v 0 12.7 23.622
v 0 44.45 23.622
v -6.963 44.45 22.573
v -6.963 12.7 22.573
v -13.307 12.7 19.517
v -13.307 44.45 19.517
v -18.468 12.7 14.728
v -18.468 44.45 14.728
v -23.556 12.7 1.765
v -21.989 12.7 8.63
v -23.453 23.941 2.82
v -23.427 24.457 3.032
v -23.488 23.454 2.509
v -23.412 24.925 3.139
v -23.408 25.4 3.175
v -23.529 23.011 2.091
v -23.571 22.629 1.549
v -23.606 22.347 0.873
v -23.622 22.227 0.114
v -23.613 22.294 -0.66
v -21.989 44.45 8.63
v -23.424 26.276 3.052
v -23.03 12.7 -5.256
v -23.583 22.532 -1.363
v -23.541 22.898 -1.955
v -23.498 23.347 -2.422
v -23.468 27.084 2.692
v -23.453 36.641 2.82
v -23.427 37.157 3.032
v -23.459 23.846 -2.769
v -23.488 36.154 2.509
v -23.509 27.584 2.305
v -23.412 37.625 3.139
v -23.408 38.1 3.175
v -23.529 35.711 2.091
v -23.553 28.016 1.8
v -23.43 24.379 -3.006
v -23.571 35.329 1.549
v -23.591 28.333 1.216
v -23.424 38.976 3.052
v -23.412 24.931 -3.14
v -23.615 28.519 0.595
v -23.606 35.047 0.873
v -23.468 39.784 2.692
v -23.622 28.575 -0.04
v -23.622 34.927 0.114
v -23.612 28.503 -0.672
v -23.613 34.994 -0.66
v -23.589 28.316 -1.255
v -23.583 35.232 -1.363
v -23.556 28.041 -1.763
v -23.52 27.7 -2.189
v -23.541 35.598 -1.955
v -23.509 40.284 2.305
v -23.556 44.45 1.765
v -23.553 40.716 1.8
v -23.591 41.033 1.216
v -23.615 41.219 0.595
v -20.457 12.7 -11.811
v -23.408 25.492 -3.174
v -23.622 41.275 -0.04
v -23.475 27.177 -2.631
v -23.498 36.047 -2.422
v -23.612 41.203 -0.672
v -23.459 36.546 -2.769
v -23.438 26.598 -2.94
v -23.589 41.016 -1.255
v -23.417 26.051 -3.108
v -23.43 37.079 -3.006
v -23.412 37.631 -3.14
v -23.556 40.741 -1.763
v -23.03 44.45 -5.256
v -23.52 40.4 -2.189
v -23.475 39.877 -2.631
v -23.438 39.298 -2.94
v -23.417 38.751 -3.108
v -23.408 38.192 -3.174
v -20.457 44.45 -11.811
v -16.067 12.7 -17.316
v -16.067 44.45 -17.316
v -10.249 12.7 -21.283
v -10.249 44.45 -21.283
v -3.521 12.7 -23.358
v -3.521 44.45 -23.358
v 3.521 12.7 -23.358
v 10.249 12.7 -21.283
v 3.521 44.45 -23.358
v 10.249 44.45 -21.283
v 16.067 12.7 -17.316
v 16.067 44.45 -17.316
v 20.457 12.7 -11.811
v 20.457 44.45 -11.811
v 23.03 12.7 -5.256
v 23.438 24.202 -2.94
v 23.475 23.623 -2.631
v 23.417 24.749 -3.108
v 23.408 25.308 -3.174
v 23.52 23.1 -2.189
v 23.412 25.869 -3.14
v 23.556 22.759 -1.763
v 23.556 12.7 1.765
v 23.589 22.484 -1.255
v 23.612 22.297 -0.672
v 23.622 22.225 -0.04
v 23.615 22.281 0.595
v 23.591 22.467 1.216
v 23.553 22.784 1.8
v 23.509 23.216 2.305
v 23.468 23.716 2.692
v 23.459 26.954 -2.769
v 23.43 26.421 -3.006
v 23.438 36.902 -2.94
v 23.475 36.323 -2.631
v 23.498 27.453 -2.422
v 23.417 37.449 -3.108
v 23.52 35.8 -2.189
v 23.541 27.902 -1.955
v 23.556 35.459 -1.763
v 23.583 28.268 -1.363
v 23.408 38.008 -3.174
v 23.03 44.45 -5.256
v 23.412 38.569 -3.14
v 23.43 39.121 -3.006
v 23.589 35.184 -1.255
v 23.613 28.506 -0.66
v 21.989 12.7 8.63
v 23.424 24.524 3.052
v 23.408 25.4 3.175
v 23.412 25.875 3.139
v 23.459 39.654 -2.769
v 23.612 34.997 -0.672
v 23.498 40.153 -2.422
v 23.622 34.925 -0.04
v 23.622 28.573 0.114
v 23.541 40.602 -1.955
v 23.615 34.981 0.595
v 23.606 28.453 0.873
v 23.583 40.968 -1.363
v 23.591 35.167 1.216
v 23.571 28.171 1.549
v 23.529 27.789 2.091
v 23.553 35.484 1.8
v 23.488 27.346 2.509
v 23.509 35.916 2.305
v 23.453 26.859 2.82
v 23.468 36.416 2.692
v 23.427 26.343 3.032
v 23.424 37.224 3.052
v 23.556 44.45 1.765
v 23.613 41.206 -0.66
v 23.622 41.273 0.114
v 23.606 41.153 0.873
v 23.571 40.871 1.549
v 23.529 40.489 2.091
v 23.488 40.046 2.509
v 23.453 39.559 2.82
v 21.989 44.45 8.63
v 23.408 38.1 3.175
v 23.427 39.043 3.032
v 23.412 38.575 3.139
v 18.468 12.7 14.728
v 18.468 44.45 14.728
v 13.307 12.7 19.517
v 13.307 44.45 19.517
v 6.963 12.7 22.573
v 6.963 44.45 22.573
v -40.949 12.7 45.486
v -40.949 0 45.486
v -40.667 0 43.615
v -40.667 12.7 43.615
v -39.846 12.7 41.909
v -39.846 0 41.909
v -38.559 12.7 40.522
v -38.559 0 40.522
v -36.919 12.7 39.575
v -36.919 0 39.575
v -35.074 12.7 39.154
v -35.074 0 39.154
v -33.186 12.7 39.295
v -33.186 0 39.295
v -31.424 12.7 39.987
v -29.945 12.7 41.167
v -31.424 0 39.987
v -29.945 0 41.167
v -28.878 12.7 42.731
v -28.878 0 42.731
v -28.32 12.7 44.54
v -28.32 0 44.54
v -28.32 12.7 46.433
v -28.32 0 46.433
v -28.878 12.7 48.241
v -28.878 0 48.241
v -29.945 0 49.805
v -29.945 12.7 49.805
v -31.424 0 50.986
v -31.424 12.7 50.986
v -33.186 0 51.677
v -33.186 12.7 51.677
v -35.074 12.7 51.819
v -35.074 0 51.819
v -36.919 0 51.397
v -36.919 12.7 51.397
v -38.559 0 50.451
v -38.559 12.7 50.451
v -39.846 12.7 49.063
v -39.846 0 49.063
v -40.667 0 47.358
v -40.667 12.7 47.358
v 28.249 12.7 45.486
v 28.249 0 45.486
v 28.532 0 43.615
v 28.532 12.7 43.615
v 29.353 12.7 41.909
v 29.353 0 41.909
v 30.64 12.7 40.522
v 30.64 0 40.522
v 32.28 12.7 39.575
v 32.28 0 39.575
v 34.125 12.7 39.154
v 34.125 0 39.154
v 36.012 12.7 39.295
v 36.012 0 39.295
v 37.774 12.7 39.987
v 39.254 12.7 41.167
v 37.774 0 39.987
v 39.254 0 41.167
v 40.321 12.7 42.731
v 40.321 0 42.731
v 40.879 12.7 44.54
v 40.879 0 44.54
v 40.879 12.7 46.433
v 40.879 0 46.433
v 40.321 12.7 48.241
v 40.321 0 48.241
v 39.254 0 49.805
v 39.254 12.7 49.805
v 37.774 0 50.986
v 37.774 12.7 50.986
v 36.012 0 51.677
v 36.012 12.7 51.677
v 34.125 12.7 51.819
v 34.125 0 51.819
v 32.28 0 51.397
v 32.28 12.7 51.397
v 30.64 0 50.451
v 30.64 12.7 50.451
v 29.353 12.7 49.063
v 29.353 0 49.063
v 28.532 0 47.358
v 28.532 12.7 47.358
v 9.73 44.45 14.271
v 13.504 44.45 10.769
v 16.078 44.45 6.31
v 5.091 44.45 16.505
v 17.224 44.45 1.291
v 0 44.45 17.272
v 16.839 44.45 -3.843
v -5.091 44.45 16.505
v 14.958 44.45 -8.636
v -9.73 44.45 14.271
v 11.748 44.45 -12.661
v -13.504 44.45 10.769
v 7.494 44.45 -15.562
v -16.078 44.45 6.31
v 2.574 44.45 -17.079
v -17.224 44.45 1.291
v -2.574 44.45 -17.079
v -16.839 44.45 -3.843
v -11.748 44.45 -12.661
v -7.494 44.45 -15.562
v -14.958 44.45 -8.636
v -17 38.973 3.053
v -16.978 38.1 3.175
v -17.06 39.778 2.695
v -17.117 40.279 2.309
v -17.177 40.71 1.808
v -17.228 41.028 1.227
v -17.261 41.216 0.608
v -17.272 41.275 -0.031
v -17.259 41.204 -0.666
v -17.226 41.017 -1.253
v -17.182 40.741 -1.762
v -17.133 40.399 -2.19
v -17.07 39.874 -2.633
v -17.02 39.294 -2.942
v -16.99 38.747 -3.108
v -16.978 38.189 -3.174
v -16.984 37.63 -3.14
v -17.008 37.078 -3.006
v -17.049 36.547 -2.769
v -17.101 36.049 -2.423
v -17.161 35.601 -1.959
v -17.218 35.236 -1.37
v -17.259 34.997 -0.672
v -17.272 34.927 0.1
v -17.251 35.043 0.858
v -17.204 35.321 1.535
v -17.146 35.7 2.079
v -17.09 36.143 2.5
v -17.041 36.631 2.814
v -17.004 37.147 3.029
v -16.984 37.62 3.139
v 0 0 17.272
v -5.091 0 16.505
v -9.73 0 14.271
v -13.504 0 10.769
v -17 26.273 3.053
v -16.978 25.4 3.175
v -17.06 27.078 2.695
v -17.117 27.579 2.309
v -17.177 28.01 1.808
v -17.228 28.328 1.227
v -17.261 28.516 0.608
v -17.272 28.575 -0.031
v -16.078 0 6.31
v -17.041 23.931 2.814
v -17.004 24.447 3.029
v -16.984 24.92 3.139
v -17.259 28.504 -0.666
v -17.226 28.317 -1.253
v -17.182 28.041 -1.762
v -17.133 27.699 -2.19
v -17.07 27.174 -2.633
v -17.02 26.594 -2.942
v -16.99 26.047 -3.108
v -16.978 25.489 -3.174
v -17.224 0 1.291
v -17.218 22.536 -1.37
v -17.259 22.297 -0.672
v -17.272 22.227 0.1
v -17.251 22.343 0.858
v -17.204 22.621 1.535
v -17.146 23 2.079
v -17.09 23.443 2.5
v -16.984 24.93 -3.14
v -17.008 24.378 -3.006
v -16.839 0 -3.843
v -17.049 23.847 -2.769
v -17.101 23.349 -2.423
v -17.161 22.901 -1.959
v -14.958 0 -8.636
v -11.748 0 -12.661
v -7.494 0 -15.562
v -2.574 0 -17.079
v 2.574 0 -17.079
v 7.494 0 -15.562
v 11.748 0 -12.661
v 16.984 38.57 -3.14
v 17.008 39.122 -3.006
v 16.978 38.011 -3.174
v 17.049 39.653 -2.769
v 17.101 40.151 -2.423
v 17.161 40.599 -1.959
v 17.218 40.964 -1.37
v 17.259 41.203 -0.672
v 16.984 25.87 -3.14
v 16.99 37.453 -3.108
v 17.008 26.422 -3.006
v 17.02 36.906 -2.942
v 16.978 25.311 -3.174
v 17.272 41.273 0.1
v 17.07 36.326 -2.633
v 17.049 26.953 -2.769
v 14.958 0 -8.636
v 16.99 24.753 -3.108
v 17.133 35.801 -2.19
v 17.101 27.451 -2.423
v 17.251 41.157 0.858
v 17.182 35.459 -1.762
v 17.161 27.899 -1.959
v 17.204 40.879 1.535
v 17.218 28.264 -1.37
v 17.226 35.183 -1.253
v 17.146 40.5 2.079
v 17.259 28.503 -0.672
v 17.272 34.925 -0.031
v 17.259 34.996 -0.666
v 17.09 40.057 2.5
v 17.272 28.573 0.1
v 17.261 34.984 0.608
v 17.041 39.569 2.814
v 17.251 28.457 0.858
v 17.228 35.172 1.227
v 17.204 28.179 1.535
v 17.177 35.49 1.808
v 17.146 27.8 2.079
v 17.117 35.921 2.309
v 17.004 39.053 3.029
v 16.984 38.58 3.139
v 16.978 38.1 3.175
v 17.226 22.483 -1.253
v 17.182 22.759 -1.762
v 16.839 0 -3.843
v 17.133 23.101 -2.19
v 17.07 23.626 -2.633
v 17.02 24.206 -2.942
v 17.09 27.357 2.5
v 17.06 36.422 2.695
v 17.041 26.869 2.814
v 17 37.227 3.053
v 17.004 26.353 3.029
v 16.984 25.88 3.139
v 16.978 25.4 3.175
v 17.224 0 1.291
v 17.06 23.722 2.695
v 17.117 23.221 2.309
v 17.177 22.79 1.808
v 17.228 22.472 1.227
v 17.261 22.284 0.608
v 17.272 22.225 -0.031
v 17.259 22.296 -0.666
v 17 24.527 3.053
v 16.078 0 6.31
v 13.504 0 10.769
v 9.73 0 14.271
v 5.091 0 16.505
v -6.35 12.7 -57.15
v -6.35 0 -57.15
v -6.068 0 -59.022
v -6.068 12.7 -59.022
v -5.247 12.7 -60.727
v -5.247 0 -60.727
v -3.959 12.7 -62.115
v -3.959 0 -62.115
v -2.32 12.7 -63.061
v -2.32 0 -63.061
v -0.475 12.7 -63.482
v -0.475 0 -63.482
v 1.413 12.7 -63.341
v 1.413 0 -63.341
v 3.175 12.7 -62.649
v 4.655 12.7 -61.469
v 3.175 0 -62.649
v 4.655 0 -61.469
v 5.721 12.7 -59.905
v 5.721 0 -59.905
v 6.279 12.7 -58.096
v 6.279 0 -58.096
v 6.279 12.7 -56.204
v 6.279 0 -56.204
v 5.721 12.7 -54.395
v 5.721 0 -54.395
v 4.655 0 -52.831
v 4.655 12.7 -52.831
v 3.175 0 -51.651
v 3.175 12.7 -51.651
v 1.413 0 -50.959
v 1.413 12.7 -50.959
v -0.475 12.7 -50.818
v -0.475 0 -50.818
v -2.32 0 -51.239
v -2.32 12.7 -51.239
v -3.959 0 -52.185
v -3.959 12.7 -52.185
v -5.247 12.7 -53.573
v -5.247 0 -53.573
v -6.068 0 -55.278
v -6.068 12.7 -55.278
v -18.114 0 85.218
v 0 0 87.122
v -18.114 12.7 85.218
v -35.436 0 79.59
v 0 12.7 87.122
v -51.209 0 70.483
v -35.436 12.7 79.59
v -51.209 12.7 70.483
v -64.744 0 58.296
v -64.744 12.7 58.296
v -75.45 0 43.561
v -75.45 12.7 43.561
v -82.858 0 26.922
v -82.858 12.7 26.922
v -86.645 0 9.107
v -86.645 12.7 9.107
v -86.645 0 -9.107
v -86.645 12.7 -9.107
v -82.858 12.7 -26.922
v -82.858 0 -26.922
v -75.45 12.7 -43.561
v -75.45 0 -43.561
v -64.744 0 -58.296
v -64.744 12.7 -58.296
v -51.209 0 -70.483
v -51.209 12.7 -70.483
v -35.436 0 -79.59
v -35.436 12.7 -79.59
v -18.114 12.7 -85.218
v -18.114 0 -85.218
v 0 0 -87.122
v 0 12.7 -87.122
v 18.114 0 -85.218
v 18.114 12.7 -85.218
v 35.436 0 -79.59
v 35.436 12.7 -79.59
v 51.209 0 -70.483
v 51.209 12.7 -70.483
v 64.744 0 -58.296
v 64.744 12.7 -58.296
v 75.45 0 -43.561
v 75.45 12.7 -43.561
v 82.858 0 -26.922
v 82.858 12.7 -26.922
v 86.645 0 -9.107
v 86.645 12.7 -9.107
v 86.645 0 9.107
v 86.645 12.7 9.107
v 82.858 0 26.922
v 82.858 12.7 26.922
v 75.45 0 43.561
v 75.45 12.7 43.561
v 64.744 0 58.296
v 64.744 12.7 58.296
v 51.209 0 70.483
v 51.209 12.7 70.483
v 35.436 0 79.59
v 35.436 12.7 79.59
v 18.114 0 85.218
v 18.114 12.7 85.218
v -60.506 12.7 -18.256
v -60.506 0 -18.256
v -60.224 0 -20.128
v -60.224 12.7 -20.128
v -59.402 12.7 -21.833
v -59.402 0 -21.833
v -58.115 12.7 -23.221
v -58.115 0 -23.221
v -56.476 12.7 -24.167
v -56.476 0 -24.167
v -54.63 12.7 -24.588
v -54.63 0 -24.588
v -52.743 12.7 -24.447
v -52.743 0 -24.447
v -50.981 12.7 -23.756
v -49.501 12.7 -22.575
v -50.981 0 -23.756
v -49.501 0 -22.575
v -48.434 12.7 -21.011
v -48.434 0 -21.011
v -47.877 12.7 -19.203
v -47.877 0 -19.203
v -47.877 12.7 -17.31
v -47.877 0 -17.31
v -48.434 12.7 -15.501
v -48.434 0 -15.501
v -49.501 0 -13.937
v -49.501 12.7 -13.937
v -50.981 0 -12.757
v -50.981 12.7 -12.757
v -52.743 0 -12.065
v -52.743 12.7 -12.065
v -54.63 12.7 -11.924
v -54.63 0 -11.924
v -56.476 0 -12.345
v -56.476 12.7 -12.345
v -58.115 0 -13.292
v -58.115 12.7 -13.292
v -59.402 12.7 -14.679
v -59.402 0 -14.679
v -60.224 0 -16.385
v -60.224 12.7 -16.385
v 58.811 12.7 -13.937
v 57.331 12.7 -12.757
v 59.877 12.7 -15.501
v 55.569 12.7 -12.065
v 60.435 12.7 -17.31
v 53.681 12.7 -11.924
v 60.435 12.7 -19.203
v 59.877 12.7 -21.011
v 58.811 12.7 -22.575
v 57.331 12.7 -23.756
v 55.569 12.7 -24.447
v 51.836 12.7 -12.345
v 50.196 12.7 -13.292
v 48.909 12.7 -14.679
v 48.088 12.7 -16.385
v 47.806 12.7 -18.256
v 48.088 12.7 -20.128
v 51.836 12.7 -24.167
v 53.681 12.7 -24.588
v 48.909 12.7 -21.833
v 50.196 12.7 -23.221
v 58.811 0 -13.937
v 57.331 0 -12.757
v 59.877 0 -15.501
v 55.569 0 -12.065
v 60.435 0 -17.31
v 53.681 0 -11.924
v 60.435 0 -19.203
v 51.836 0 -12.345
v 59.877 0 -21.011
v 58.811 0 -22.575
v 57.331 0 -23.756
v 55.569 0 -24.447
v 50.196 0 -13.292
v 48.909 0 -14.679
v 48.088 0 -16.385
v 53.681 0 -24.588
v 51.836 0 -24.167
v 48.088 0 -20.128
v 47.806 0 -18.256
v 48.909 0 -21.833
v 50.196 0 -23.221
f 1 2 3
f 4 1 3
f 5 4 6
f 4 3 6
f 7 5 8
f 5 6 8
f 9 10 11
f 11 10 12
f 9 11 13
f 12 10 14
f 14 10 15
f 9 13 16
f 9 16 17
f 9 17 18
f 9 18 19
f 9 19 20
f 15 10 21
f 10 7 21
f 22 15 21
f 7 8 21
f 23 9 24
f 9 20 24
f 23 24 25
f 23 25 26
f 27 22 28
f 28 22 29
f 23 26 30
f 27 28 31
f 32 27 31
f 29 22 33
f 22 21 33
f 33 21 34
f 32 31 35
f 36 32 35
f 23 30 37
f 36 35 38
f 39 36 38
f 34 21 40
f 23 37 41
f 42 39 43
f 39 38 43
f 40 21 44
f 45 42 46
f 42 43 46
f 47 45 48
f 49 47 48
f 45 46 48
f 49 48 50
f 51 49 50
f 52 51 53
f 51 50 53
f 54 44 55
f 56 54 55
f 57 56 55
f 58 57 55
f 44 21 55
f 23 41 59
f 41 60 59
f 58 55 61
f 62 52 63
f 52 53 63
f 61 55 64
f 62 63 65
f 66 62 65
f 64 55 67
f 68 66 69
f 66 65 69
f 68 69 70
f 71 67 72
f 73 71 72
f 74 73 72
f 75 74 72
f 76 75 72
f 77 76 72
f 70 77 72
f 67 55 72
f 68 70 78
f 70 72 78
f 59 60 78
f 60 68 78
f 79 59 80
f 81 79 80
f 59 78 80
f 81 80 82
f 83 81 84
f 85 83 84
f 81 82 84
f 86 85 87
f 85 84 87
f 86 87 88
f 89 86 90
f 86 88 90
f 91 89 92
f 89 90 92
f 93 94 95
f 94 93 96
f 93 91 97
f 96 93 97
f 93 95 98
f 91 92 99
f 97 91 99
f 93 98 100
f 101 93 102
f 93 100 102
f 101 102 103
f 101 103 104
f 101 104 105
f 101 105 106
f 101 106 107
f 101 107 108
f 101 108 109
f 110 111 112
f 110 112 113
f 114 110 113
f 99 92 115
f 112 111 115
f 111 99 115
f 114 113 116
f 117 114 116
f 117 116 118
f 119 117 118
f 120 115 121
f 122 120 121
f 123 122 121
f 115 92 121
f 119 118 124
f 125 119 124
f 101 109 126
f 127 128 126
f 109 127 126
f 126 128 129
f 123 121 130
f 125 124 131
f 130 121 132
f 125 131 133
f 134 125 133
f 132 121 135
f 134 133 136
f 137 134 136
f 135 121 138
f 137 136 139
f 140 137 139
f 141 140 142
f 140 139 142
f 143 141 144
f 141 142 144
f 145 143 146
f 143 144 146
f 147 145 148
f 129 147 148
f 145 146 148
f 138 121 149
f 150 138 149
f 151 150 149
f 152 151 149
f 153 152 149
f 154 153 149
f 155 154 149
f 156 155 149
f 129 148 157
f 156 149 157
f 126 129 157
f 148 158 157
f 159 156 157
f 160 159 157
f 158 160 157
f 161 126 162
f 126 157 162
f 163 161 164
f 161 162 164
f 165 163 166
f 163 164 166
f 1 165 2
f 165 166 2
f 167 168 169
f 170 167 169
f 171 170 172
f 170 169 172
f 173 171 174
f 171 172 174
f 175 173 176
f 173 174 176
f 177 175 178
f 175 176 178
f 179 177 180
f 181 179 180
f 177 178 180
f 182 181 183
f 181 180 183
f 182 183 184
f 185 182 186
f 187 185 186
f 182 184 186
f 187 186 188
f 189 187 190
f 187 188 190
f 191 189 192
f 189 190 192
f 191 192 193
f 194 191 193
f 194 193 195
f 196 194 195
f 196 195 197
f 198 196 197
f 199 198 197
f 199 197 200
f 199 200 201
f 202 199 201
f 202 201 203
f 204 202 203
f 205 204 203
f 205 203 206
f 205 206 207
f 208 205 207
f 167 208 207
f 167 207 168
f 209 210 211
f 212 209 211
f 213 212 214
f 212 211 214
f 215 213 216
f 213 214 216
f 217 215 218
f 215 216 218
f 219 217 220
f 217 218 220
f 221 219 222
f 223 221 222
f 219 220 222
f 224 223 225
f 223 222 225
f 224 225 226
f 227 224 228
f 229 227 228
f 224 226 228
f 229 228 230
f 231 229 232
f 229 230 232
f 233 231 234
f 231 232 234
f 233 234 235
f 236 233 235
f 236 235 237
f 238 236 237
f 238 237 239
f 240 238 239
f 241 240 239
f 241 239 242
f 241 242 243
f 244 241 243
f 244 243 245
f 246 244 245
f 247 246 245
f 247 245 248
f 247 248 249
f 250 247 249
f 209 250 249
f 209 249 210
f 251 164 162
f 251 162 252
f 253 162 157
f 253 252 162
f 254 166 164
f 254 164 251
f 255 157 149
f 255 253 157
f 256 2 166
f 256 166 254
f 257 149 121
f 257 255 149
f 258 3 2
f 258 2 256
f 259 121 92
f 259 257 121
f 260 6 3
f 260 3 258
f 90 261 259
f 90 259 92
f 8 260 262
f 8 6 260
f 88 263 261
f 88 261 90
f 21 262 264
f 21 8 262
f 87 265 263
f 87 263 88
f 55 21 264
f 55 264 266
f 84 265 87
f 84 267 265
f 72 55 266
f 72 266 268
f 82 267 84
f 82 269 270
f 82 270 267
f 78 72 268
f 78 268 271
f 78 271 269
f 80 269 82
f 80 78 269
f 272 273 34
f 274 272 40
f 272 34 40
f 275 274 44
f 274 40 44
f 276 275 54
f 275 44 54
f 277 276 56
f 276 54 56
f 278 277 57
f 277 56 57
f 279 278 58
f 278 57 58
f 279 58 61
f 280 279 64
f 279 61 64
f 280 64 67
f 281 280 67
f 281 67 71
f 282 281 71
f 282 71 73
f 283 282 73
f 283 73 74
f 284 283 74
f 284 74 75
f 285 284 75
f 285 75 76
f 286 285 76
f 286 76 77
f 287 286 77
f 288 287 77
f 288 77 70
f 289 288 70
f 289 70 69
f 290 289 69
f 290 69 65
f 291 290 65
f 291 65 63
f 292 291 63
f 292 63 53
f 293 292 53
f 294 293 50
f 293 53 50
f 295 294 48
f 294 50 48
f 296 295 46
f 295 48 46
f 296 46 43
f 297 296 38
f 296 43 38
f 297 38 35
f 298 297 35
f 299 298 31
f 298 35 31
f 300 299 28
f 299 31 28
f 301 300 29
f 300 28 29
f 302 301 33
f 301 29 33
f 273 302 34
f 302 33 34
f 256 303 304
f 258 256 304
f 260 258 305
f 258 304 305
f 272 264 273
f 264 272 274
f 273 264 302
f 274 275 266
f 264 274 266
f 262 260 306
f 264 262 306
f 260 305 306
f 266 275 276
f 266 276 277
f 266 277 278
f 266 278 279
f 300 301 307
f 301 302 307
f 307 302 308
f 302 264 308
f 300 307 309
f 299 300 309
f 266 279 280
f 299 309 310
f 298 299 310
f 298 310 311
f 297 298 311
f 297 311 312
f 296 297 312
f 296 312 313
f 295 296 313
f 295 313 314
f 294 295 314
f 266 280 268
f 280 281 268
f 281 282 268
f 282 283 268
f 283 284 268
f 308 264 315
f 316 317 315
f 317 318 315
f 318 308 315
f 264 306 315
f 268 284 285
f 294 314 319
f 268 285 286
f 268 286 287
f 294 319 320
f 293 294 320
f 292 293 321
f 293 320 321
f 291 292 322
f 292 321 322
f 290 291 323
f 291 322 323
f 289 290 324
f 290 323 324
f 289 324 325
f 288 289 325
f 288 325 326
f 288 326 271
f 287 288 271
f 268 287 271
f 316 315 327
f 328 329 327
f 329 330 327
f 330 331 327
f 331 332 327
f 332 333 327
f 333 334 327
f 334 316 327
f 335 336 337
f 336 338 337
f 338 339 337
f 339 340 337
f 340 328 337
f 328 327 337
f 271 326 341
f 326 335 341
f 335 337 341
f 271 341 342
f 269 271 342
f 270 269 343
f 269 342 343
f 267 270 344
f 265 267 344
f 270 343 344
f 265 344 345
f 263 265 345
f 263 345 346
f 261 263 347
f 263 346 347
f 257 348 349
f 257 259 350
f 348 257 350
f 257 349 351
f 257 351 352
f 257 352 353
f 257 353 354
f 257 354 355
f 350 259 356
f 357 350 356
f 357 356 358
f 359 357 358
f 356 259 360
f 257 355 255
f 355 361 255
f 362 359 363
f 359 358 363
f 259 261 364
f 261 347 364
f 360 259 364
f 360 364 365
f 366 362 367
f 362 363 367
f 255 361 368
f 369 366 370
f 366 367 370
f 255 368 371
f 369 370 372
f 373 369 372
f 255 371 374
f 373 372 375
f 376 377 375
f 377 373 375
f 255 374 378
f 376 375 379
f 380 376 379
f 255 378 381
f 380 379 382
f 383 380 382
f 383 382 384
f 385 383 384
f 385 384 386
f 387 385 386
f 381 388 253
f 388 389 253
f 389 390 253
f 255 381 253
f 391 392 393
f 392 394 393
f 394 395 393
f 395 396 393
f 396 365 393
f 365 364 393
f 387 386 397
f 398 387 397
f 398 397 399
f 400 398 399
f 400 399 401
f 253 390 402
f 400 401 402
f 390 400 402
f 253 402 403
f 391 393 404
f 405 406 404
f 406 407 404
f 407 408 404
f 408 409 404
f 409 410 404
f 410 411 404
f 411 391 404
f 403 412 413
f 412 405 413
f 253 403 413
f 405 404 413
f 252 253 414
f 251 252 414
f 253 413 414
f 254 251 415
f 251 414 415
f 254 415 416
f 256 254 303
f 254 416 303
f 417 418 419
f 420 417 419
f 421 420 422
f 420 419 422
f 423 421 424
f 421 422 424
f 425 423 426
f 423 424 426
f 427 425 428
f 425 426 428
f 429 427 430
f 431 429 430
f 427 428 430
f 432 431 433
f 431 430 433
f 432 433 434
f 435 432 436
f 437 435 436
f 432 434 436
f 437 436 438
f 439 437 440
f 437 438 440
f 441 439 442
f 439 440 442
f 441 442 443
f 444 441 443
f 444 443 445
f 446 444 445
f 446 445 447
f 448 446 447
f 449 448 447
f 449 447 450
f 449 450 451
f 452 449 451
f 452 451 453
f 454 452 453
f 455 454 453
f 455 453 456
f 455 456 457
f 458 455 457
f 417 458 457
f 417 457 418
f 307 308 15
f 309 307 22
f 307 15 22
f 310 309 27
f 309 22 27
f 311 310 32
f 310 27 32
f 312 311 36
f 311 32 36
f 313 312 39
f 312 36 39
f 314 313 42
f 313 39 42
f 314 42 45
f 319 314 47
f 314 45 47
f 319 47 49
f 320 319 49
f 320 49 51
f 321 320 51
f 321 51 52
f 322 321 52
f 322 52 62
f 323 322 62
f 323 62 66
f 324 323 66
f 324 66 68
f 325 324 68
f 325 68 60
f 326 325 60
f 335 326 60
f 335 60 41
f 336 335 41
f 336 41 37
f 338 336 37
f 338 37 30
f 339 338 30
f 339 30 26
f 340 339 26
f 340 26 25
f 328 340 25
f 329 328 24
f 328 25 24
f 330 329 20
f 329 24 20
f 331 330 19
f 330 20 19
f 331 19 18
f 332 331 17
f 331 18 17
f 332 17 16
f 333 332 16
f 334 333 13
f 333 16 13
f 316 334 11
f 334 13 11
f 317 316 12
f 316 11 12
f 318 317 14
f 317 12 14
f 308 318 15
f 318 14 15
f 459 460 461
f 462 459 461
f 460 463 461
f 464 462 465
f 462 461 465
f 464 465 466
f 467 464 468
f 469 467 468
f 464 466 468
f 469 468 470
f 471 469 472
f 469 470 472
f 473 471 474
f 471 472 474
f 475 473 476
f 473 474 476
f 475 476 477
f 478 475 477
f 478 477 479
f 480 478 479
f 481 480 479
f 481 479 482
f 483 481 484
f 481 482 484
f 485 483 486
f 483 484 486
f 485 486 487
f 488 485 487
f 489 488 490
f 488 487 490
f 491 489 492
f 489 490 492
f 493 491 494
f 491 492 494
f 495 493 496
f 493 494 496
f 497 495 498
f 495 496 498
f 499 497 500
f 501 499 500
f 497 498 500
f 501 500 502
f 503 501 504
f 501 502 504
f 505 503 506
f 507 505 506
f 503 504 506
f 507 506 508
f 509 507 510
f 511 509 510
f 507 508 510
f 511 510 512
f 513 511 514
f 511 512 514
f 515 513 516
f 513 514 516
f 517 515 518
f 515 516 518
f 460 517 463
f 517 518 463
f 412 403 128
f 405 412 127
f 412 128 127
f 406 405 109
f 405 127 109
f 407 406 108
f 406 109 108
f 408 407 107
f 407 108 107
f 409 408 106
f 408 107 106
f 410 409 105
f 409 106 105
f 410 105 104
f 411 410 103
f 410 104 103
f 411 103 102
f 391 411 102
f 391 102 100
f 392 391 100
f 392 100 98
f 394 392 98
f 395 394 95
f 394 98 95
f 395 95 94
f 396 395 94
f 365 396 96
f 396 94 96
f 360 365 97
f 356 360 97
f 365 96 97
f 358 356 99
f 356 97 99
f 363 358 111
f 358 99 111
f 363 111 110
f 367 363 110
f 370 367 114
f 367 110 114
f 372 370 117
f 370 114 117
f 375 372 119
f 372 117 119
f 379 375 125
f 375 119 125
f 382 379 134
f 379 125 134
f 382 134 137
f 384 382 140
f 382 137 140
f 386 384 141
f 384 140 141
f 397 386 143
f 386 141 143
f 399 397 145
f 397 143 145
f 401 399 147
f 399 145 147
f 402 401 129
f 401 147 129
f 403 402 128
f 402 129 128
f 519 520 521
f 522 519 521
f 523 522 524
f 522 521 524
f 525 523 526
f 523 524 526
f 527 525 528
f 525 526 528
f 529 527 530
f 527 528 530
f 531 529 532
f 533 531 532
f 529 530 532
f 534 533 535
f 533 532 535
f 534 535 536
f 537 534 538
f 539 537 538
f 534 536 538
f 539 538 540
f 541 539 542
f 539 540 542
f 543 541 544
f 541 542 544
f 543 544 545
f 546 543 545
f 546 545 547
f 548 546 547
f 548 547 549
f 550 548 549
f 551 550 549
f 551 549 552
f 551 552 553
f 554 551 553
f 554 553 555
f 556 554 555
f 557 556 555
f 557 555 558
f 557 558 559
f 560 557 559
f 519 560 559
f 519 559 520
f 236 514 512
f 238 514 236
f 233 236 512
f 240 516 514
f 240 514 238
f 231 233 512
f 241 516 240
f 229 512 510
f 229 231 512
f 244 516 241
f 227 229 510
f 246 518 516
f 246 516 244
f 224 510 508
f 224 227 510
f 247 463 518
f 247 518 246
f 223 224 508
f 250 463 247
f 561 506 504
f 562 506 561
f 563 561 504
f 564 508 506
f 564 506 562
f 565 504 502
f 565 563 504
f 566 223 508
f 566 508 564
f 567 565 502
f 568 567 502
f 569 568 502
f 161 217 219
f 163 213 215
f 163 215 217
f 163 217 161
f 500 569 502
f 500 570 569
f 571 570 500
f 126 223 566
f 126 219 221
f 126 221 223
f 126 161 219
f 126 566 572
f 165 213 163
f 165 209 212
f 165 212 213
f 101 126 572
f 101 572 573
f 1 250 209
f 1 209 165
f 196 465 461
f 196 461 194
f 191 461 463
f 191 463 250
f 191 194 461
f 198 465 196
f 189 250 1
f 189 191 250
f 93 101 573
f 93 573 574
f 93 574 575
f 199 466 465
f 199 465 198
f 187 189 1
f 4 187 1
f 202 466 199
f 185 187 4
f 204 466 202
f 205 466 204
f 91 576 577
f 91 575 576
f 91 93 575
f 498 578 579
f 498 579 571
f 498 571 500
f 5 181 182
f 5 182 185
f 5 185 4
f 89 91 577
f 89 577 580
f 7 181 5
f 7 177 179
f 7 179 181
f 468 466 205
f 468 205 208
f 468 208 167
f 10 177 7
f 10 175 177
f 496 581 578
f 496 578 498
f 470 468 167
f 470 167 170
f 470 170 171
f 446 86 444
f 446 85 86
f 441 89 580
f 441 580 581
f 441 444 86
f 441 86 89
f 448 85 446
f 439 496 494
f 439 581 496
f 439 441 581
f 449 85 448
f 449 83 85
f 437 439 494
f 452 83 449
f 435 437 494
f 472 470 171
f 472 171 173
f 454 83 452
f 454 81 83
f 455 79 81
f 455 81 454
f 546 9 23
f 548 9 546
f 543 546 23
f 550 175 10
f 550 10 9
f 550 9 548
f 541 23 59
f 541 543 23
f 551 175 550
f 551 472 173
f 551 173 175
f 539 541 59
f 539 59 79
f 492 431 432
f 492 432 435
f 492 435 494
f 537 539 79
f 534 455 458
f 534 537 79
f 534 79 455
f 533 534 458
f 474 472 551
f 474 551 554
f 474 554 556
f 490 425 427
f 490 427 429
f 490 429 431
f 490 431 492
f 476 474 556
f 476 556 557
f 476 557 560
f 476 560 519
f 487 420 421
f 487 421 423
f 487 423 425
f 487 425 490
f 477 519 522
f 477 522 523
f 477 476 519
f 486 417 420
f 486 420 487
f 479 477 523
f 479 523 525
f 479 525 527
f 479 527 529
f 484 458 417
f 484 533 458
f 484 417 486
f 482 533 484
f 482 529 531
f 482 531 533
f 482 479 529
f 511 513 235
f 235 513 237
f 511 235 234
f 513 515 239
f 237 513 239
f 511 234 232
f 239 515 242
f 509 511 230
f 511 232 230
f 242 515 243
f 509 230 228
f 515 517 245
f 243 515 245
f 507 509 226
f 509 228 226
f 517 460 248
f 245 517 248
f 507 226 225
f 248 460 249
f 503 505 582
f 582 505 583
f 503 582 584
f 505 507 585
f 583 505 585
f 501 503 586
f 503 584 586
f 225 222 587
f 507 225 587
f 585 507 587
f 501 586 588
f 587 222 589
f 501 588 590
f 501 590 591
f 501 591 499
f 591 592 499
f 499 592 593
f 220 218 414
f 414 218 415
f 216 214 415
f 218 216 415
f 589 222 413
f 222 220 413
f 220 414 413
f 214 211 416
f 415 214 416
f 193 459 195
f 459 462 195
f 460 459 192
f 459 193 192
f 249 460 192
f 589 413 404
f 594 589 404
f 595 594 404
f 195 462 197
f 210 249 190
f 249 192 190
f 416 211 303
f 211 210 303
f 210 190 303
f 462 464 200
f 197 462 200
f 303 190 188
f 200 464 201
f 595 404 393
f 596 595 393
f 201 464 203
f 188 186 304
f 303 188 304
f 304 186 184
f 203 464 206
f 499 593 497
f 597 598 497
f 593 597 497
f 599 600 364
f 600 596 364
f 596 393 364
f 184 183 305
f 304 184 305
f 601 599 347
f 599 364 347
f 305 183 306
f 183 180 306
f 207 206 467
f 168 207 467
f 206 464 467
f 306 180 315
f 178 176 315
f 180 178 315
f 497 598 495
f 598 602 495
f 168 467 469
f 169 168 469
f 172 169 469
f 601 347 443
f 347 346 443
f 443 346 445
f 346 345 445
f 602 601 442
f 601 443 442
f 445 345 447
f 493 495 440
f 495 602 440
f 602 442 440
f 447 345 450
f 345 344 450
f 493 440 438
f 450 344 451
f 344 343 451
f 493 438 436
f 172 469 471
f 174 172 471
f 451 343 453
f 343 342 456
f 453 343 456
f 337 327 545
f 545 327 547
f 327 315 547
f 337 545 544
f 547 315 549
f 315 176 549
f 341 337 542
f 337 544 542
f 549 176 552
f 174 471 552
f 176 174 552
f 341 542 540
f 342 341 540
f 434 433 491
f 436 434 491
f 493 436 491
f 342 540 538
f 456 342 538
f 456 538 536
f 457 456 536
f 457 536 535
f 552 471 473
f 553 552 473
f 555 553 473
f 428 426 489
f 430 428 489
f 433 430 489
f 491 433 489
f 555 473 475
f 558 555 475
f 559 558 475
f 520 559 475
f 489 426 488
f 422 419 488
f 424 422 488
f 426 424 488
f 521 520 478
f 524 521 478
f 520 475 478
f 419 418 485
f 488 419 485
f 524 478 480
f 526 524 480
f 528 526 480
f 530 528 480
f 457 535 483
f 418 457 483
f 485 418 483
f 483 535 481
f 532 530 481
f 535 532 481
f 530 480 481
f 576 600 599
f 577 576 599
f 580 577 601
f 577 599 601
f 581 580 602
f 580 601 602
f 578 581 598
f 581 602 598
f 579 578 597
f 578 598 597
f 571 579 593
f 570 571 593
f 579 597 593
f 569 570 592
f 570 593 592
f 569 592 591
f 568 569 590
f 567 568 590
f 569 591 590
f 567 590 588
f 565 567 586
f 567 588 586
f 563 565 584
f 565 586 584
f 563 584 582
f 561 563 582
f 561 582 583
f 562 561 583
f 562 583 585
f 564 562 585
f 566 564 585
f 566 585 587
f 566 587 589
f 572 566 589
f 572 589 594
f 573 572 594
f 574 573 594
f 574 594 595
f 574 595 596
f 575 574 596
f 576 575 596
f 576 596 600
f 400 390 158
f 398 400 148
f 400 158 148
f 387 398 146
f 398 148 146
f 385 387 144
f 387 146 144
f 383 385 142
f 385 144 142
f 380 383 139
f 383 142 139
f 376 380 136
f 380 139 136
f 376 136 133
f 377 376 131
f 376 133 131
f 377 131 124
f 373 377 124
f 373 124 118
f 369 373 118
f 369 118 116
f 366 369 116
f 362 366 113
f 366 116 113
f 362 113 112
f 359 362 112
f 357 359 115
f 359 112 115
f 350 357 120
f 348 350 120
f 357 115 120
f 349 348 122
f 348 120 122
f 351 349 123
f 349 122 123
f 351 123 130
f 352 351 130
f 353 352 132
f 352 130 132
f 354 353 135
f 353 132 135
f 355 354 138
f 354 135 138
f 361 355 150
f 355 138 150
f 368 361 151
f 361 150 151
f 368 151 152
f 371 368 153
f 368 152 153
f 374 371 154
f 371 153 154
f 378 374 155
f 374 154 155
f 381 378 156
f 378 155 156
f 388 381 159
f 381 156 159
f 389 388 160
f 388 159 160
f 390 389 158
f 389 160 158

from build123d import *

# Parameters (mm, degrees)
SKETCH1_W                            = 6.35
SKETCH1_H                            = 31.75
SKETCH1_W_2                          = 69.85
SKETCH1_H_2                          = 12.7
F_1_2_20_TAPPED_HOLE1_D              = 12.7
SKETCH7_W                            = 3.175
SKETCH7_H                            = 87.122
F_1_4_0_25_DIAMETER_HOLE1_AT_2_COUNT = 2
F_1_4_0_25_DIAMETER_HOLE1_AT_2_PITCH = 12.7
F_1_4_0_25_DIAMETER_HOLE2_D          = 6.35


with BuildPart() as part:
    # Sketch1 → Revolve1 (revolve)
    with BuildSketch(Plane.XY, mode=Mode.PRIVATE) as revolve1_sk:
        with Locations((20.447, 28.575)):
            Rectangle(SKETCH1_W, SKETCH1_H)
        with Locations((52.197, 6.35)):
            Rectangle(SKETCH1_W_2, SKETCH1_H_2)
    revolve(revolve1_sk.sketch.rotate(Axis((0, 7.809475806, 0), (0, -1, 0)), 90), axis=Axis((0, 7.809475806, 0), (0, -1, 0)))

    # 1/2-20 Tapped Hole1 (through all)
    with Locations(Plane(origin=(0, 12.7, 0), x_dir=(1, 0, 0), z_dir=(0, 1, 0))):
        with Locations((-54.155626078, 18.25625), (0, 57.15), (54.155626078, 18.25625), (34.599427772, -45.486284722), (-34.599427772, -45.486284722)):
            Hole(F_1_2_20_TAPPED_HOLE1_D / 2)

    # Sketch7 → 1/4 (0.25) Diameter Hole1 (revolve, cut)
    with BuildSketch(Plane.ZX.offset(38.1)):
        with Locations((1.5875, 43.561)):
            Rectangle(SKETCH7_W, SKETCH7_H)
    f_1_4_0_25_diameter_hole1 = revolve(axis=Axis((-6.35, 38.1, 0), (1, 0, 0)), mode=Mode.SUBTRACT)

    # 1/4 (0.25) Diameter Hole1 at 2: 1/4 (0.25) Diameter Hole1 ×2
    with Locations(*[(0, -i * F_1_4_0_25_DIAMETER_HOLE1_AT_2_PITCH, 0) for i in range(1, F_1_4_0_25_DIAMETER_HOLE1_AT_2_COUNT)]):
        add(f_1_4_0_25_diameter_hole1, mode=Mode.SUBTRACT)

    # 1/4 (0.25) Diameter Hole2 (through all)
    with Locations(Plane(origin=(0, 0, 0), x_dir=(0, 0, -1), z_dir=(1, 0, 0))):
        with Locations((0, 38.1), (0, 25.4)):
            Hole(F_1_4_0_25_DIAMETER_HOLE2_D / 2)


solid = part.part
